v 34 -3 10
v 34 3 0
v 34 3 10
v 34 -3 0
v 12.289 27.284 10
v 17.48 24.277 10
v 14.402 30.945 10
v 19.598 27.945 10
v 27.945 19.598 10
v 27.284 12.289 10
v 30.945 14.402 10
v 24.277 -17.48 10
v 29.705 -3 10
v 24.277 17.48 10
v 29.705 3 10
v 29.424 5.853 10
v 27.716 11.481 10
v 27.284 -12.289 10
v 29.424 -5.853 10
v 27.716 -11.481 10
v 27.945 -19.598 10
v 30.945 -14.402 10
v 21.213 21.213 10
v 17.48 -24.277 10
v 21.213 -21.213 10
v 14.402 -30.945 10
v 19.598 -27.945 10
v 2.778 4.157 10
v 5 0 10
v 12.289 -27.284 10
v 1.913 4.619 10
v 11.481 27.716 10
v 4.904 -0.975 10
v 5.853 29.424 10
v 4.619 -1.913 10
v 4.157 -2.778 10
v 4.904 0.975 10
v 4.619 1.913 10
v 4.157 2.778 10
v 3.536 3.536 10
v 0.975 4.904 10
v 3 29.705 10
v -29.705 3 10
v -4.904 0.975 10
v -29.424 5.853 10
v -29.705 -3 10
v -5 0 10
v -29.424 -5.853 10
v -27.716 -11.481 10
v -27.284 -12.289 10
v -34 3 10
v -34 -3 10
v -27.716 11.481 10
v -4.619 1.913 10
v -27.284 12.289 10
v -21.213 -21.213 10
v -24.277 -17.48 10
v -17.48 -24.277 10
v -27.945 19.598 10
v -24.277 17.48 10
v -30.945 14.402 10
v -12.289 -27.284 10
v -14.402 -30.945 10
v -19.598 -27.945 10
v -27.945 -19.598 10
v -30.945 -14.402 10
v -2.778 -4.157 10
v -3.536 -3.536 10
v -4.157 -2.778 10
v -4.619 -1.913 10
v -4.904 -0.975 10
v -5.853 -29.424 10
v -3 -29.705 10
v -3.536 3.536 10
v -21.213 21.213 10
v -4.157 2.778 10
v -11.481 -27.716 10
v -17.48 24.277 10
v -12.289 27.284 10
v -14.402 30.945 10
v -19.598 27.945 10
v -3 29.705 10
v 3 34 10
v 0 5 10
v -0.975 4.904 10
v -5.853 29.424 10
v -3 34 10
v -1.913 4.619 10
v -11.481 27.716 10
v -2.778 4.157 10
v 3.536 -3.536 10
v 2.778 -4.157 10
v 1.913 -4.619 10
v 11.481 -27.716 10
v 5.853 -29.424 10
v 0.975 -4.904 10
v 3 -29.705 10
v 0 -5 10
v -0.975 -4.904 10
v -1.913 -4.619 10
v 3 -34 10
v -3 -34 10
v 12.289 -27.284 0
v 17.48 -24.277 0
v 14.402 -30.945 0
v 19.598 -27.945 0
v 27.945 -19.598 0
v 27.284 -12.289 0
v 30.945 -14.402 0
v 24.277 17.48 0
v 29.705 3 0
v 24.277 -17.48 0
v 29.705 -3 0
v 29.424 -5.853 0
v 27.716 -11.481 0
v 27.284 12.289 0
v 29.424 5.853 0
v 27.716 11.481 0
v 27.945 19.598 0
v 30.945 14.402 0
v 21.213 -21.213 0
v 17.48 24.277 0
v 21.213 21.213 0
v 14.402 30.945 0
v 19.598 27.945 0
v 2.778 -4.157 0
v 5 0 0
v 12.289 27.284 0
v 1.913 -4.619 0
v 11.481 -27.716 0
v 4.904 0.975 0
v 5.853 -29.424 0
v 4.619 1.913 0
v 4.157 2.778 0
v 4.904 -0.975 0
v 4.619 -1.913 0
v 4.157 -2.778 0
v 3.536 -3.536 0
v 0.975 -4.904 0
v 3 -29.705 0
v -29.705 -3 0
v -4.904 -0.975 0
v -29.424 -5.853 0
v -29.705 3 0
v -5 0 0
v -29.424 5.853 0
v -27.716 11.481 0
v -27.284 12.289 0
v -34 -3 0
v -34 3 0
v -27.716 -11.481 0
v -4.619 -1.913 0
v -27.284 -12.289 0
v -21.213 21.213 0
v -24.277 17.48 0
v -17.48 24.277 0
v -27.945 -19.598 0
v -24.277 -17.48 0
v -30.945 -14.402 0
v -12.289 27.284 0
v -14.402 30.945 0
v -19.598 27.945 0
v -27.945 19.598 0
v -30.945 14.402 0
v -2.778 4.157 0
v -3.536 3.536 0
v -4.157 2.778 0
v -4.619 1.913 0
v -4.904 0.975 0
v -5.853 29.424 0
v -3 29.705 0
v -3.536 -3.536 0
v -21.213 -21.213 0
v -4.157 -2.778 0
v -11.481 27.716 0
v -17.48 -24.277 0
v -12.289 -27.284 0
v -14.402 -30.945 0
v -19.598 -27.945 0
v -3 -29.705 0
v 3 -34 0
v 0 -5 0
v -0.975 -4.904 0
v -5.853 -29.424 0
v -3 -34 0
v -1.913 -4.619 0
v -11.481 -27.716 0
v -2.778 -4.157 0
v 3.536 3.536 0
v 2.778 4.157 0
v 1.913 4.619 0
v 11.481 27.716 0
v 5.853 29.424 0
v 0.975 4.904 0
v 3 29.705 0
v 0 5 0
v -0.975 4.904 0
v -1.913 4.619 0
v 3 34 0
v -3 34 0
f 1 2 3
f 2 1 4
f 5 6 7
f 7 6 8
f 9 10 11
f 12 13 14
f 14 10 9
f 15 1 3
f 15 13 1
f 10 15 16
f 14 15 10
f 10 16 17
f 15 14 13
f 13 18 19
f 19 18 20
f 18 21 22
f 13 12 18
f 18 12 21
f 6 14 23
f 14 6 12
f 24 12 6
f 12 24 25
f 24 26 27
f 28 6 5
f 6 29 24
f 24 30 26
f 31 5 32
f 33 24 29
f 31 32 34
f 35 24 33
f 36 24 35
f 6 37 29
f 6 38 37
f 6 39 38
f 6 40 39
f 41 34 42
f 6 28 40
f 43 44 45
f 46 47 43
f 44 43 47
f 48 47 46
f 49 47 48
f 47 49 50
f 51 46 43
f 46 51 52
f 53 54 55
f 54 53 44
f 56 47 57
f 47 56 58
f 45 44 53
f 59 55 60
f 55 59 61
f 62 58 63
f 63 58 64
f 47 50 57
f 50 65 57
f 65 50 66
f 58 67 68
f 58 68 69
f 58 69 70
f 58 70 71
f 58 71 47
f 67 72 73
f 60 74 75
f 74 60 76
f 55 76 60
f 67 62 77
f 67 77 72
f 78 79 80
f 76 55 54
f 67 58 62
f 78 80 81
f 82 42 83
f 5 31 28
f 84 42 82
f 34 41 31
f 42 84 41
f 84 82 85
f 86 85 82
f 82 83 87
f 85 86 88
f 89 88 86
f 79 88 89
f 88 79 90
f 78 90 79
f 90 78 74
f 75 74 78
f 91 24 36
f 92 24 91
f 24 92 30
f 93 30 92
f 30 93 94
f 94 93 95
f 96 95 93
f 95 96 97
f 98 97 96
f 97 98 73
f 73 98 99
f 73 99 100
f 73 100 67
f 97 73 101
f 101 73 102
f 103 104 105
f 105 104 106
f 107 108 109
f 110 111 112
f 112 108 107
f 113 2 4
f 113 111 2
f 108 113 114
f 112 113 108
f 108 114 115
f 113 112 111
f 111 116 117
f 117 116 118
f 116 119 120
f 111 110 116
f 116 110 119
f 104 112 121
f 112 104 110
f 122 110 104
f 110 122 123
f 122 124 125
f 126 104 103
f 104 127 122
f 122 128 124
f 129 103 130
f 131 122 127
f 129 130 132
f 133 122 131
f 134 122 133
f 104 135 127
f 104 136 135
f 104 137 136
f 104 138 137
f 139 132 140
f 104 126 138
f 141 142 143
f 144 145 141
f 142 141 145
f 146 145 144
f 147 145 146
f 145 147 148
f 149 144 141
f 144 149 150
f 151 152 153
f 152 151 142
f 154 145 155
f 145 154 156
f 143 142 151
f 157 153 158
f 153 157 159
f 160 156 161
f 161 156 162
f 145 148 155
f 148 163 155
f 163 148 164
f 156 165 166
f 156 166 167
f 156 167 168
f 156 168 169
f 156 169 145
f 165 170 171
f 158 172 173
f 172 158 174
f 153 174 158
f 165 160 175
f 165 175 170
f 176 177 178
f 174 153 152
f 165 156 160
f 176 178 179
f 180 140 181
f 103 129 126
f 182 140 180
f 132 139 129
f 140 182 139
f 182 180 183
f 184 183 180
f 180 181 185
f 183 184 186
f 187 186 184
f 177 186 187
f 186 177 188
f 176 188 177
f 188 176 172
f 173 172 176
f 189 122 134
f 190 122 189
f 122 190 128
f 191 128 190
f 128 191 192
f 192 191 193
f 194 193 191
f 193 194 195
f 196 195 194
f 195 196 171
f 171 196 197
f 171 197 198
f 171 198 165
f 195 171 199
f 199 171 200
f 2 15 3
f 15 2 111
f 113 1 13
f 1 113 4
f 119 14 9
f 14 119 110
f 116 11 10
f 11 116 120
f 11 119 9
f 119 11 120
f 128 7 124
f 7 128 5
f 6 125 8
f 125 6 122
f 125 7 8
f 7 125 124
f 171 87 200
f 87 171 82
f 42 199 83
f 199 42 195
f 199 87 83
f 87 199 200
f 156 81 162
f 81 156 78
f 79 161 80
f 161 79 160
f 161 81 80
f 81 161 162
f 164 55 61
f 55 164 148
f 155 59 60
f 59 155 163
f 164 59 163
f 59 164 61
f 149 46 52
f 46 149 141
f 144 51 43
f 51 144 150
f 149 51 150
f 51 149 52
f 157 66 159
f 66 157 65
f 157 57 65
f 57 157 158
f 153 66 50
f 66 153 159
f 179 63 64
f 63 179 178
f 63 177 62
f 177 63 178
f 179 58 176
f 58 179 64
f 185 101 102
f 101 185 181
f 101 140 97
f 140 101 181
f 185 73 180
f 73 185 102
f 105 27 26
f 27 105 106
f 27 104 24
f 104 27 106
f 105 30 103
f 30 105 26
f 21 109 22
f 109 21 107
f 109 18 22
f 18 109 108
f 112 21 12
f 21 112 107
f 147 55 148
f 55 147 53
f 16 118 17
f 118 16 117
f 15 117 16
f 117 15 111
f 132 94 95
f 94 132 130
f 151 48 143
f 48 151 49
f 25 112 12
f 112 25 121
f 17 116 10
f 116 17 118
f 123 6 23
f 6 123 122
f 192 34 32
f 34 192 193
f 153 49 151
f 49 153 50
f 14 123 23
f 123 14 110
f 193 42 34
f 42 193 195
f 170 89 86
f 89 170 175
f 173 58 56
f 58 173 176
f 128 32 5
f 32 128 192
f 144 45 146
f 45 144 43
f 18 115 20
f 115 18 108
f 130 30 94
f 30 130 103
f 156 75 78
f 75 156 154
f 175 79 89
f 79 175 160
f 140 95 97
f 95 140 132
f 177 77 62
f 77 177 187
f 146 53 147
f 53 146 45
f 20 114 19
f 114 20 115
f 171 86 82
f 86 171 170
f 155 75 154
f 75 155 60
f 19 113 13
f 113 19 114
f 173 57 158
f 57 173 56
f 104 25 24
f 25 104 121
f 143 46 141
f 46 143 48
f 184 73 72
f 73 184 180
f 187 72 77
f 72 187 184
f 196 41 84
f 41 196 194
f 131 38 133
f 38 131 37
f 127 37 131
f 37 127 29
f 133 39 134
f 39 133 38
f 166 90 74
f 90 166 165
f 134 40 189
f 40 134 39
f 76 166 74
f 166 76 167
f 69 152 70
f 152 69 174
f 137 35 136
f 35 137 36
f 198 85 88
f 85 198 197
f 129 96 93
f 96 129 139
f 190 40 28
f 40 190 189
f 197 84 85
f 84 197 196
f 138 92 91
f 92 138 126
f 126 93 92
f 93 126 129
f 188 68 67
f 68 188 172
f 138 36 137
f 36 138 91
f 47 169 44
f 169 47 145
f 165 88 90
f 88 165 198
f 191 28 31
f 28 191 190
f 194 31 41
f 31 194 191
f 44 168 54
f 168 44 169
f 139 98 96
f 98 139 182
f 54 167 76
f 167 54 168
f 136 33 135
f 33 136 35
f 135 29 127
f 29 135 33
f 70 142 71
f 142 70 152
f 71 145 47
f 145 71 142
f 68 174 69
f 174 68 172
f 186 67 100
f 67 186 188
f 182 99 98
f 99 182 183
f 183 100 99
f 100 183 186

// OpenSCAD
$fn = 32;

// ----------------------------------------------------------------------
// Spur blank: bored gear blank
// ----------------------------------------------------------------------

// --- parameters (mm) ---
disc_r = 30;              // blank root radius
disc_t = 10;              // blank thickness
n_teeth = 12;             // stub tooth count
tooth_w = 6;              // tooth width at the root
tooth_h = 4;              // tooth height above the root
bore_r = 5;               // central bore radius

out_r = disc_r + tooth_h;  // tip radius
bbox_x = 68.0;  // measured width over the teeth
bbox_y = 68.0;  // measured depth over the teeth

difference() {
union() {
  cylinder(r = disc_r, h = disc_t);
  for (i = [0 : n_teeth - 1])
    rotate([0, 0, i * 360 / n_teeth])
      translate([disc_r - 1, -tooth_w / 2, 0])
        cube([tooth_h + 1, tooth_w, disc_t]);
}
  translate([0, 0, -1]) cylinder(r = bore_r, h = disc_t + 2);
}
